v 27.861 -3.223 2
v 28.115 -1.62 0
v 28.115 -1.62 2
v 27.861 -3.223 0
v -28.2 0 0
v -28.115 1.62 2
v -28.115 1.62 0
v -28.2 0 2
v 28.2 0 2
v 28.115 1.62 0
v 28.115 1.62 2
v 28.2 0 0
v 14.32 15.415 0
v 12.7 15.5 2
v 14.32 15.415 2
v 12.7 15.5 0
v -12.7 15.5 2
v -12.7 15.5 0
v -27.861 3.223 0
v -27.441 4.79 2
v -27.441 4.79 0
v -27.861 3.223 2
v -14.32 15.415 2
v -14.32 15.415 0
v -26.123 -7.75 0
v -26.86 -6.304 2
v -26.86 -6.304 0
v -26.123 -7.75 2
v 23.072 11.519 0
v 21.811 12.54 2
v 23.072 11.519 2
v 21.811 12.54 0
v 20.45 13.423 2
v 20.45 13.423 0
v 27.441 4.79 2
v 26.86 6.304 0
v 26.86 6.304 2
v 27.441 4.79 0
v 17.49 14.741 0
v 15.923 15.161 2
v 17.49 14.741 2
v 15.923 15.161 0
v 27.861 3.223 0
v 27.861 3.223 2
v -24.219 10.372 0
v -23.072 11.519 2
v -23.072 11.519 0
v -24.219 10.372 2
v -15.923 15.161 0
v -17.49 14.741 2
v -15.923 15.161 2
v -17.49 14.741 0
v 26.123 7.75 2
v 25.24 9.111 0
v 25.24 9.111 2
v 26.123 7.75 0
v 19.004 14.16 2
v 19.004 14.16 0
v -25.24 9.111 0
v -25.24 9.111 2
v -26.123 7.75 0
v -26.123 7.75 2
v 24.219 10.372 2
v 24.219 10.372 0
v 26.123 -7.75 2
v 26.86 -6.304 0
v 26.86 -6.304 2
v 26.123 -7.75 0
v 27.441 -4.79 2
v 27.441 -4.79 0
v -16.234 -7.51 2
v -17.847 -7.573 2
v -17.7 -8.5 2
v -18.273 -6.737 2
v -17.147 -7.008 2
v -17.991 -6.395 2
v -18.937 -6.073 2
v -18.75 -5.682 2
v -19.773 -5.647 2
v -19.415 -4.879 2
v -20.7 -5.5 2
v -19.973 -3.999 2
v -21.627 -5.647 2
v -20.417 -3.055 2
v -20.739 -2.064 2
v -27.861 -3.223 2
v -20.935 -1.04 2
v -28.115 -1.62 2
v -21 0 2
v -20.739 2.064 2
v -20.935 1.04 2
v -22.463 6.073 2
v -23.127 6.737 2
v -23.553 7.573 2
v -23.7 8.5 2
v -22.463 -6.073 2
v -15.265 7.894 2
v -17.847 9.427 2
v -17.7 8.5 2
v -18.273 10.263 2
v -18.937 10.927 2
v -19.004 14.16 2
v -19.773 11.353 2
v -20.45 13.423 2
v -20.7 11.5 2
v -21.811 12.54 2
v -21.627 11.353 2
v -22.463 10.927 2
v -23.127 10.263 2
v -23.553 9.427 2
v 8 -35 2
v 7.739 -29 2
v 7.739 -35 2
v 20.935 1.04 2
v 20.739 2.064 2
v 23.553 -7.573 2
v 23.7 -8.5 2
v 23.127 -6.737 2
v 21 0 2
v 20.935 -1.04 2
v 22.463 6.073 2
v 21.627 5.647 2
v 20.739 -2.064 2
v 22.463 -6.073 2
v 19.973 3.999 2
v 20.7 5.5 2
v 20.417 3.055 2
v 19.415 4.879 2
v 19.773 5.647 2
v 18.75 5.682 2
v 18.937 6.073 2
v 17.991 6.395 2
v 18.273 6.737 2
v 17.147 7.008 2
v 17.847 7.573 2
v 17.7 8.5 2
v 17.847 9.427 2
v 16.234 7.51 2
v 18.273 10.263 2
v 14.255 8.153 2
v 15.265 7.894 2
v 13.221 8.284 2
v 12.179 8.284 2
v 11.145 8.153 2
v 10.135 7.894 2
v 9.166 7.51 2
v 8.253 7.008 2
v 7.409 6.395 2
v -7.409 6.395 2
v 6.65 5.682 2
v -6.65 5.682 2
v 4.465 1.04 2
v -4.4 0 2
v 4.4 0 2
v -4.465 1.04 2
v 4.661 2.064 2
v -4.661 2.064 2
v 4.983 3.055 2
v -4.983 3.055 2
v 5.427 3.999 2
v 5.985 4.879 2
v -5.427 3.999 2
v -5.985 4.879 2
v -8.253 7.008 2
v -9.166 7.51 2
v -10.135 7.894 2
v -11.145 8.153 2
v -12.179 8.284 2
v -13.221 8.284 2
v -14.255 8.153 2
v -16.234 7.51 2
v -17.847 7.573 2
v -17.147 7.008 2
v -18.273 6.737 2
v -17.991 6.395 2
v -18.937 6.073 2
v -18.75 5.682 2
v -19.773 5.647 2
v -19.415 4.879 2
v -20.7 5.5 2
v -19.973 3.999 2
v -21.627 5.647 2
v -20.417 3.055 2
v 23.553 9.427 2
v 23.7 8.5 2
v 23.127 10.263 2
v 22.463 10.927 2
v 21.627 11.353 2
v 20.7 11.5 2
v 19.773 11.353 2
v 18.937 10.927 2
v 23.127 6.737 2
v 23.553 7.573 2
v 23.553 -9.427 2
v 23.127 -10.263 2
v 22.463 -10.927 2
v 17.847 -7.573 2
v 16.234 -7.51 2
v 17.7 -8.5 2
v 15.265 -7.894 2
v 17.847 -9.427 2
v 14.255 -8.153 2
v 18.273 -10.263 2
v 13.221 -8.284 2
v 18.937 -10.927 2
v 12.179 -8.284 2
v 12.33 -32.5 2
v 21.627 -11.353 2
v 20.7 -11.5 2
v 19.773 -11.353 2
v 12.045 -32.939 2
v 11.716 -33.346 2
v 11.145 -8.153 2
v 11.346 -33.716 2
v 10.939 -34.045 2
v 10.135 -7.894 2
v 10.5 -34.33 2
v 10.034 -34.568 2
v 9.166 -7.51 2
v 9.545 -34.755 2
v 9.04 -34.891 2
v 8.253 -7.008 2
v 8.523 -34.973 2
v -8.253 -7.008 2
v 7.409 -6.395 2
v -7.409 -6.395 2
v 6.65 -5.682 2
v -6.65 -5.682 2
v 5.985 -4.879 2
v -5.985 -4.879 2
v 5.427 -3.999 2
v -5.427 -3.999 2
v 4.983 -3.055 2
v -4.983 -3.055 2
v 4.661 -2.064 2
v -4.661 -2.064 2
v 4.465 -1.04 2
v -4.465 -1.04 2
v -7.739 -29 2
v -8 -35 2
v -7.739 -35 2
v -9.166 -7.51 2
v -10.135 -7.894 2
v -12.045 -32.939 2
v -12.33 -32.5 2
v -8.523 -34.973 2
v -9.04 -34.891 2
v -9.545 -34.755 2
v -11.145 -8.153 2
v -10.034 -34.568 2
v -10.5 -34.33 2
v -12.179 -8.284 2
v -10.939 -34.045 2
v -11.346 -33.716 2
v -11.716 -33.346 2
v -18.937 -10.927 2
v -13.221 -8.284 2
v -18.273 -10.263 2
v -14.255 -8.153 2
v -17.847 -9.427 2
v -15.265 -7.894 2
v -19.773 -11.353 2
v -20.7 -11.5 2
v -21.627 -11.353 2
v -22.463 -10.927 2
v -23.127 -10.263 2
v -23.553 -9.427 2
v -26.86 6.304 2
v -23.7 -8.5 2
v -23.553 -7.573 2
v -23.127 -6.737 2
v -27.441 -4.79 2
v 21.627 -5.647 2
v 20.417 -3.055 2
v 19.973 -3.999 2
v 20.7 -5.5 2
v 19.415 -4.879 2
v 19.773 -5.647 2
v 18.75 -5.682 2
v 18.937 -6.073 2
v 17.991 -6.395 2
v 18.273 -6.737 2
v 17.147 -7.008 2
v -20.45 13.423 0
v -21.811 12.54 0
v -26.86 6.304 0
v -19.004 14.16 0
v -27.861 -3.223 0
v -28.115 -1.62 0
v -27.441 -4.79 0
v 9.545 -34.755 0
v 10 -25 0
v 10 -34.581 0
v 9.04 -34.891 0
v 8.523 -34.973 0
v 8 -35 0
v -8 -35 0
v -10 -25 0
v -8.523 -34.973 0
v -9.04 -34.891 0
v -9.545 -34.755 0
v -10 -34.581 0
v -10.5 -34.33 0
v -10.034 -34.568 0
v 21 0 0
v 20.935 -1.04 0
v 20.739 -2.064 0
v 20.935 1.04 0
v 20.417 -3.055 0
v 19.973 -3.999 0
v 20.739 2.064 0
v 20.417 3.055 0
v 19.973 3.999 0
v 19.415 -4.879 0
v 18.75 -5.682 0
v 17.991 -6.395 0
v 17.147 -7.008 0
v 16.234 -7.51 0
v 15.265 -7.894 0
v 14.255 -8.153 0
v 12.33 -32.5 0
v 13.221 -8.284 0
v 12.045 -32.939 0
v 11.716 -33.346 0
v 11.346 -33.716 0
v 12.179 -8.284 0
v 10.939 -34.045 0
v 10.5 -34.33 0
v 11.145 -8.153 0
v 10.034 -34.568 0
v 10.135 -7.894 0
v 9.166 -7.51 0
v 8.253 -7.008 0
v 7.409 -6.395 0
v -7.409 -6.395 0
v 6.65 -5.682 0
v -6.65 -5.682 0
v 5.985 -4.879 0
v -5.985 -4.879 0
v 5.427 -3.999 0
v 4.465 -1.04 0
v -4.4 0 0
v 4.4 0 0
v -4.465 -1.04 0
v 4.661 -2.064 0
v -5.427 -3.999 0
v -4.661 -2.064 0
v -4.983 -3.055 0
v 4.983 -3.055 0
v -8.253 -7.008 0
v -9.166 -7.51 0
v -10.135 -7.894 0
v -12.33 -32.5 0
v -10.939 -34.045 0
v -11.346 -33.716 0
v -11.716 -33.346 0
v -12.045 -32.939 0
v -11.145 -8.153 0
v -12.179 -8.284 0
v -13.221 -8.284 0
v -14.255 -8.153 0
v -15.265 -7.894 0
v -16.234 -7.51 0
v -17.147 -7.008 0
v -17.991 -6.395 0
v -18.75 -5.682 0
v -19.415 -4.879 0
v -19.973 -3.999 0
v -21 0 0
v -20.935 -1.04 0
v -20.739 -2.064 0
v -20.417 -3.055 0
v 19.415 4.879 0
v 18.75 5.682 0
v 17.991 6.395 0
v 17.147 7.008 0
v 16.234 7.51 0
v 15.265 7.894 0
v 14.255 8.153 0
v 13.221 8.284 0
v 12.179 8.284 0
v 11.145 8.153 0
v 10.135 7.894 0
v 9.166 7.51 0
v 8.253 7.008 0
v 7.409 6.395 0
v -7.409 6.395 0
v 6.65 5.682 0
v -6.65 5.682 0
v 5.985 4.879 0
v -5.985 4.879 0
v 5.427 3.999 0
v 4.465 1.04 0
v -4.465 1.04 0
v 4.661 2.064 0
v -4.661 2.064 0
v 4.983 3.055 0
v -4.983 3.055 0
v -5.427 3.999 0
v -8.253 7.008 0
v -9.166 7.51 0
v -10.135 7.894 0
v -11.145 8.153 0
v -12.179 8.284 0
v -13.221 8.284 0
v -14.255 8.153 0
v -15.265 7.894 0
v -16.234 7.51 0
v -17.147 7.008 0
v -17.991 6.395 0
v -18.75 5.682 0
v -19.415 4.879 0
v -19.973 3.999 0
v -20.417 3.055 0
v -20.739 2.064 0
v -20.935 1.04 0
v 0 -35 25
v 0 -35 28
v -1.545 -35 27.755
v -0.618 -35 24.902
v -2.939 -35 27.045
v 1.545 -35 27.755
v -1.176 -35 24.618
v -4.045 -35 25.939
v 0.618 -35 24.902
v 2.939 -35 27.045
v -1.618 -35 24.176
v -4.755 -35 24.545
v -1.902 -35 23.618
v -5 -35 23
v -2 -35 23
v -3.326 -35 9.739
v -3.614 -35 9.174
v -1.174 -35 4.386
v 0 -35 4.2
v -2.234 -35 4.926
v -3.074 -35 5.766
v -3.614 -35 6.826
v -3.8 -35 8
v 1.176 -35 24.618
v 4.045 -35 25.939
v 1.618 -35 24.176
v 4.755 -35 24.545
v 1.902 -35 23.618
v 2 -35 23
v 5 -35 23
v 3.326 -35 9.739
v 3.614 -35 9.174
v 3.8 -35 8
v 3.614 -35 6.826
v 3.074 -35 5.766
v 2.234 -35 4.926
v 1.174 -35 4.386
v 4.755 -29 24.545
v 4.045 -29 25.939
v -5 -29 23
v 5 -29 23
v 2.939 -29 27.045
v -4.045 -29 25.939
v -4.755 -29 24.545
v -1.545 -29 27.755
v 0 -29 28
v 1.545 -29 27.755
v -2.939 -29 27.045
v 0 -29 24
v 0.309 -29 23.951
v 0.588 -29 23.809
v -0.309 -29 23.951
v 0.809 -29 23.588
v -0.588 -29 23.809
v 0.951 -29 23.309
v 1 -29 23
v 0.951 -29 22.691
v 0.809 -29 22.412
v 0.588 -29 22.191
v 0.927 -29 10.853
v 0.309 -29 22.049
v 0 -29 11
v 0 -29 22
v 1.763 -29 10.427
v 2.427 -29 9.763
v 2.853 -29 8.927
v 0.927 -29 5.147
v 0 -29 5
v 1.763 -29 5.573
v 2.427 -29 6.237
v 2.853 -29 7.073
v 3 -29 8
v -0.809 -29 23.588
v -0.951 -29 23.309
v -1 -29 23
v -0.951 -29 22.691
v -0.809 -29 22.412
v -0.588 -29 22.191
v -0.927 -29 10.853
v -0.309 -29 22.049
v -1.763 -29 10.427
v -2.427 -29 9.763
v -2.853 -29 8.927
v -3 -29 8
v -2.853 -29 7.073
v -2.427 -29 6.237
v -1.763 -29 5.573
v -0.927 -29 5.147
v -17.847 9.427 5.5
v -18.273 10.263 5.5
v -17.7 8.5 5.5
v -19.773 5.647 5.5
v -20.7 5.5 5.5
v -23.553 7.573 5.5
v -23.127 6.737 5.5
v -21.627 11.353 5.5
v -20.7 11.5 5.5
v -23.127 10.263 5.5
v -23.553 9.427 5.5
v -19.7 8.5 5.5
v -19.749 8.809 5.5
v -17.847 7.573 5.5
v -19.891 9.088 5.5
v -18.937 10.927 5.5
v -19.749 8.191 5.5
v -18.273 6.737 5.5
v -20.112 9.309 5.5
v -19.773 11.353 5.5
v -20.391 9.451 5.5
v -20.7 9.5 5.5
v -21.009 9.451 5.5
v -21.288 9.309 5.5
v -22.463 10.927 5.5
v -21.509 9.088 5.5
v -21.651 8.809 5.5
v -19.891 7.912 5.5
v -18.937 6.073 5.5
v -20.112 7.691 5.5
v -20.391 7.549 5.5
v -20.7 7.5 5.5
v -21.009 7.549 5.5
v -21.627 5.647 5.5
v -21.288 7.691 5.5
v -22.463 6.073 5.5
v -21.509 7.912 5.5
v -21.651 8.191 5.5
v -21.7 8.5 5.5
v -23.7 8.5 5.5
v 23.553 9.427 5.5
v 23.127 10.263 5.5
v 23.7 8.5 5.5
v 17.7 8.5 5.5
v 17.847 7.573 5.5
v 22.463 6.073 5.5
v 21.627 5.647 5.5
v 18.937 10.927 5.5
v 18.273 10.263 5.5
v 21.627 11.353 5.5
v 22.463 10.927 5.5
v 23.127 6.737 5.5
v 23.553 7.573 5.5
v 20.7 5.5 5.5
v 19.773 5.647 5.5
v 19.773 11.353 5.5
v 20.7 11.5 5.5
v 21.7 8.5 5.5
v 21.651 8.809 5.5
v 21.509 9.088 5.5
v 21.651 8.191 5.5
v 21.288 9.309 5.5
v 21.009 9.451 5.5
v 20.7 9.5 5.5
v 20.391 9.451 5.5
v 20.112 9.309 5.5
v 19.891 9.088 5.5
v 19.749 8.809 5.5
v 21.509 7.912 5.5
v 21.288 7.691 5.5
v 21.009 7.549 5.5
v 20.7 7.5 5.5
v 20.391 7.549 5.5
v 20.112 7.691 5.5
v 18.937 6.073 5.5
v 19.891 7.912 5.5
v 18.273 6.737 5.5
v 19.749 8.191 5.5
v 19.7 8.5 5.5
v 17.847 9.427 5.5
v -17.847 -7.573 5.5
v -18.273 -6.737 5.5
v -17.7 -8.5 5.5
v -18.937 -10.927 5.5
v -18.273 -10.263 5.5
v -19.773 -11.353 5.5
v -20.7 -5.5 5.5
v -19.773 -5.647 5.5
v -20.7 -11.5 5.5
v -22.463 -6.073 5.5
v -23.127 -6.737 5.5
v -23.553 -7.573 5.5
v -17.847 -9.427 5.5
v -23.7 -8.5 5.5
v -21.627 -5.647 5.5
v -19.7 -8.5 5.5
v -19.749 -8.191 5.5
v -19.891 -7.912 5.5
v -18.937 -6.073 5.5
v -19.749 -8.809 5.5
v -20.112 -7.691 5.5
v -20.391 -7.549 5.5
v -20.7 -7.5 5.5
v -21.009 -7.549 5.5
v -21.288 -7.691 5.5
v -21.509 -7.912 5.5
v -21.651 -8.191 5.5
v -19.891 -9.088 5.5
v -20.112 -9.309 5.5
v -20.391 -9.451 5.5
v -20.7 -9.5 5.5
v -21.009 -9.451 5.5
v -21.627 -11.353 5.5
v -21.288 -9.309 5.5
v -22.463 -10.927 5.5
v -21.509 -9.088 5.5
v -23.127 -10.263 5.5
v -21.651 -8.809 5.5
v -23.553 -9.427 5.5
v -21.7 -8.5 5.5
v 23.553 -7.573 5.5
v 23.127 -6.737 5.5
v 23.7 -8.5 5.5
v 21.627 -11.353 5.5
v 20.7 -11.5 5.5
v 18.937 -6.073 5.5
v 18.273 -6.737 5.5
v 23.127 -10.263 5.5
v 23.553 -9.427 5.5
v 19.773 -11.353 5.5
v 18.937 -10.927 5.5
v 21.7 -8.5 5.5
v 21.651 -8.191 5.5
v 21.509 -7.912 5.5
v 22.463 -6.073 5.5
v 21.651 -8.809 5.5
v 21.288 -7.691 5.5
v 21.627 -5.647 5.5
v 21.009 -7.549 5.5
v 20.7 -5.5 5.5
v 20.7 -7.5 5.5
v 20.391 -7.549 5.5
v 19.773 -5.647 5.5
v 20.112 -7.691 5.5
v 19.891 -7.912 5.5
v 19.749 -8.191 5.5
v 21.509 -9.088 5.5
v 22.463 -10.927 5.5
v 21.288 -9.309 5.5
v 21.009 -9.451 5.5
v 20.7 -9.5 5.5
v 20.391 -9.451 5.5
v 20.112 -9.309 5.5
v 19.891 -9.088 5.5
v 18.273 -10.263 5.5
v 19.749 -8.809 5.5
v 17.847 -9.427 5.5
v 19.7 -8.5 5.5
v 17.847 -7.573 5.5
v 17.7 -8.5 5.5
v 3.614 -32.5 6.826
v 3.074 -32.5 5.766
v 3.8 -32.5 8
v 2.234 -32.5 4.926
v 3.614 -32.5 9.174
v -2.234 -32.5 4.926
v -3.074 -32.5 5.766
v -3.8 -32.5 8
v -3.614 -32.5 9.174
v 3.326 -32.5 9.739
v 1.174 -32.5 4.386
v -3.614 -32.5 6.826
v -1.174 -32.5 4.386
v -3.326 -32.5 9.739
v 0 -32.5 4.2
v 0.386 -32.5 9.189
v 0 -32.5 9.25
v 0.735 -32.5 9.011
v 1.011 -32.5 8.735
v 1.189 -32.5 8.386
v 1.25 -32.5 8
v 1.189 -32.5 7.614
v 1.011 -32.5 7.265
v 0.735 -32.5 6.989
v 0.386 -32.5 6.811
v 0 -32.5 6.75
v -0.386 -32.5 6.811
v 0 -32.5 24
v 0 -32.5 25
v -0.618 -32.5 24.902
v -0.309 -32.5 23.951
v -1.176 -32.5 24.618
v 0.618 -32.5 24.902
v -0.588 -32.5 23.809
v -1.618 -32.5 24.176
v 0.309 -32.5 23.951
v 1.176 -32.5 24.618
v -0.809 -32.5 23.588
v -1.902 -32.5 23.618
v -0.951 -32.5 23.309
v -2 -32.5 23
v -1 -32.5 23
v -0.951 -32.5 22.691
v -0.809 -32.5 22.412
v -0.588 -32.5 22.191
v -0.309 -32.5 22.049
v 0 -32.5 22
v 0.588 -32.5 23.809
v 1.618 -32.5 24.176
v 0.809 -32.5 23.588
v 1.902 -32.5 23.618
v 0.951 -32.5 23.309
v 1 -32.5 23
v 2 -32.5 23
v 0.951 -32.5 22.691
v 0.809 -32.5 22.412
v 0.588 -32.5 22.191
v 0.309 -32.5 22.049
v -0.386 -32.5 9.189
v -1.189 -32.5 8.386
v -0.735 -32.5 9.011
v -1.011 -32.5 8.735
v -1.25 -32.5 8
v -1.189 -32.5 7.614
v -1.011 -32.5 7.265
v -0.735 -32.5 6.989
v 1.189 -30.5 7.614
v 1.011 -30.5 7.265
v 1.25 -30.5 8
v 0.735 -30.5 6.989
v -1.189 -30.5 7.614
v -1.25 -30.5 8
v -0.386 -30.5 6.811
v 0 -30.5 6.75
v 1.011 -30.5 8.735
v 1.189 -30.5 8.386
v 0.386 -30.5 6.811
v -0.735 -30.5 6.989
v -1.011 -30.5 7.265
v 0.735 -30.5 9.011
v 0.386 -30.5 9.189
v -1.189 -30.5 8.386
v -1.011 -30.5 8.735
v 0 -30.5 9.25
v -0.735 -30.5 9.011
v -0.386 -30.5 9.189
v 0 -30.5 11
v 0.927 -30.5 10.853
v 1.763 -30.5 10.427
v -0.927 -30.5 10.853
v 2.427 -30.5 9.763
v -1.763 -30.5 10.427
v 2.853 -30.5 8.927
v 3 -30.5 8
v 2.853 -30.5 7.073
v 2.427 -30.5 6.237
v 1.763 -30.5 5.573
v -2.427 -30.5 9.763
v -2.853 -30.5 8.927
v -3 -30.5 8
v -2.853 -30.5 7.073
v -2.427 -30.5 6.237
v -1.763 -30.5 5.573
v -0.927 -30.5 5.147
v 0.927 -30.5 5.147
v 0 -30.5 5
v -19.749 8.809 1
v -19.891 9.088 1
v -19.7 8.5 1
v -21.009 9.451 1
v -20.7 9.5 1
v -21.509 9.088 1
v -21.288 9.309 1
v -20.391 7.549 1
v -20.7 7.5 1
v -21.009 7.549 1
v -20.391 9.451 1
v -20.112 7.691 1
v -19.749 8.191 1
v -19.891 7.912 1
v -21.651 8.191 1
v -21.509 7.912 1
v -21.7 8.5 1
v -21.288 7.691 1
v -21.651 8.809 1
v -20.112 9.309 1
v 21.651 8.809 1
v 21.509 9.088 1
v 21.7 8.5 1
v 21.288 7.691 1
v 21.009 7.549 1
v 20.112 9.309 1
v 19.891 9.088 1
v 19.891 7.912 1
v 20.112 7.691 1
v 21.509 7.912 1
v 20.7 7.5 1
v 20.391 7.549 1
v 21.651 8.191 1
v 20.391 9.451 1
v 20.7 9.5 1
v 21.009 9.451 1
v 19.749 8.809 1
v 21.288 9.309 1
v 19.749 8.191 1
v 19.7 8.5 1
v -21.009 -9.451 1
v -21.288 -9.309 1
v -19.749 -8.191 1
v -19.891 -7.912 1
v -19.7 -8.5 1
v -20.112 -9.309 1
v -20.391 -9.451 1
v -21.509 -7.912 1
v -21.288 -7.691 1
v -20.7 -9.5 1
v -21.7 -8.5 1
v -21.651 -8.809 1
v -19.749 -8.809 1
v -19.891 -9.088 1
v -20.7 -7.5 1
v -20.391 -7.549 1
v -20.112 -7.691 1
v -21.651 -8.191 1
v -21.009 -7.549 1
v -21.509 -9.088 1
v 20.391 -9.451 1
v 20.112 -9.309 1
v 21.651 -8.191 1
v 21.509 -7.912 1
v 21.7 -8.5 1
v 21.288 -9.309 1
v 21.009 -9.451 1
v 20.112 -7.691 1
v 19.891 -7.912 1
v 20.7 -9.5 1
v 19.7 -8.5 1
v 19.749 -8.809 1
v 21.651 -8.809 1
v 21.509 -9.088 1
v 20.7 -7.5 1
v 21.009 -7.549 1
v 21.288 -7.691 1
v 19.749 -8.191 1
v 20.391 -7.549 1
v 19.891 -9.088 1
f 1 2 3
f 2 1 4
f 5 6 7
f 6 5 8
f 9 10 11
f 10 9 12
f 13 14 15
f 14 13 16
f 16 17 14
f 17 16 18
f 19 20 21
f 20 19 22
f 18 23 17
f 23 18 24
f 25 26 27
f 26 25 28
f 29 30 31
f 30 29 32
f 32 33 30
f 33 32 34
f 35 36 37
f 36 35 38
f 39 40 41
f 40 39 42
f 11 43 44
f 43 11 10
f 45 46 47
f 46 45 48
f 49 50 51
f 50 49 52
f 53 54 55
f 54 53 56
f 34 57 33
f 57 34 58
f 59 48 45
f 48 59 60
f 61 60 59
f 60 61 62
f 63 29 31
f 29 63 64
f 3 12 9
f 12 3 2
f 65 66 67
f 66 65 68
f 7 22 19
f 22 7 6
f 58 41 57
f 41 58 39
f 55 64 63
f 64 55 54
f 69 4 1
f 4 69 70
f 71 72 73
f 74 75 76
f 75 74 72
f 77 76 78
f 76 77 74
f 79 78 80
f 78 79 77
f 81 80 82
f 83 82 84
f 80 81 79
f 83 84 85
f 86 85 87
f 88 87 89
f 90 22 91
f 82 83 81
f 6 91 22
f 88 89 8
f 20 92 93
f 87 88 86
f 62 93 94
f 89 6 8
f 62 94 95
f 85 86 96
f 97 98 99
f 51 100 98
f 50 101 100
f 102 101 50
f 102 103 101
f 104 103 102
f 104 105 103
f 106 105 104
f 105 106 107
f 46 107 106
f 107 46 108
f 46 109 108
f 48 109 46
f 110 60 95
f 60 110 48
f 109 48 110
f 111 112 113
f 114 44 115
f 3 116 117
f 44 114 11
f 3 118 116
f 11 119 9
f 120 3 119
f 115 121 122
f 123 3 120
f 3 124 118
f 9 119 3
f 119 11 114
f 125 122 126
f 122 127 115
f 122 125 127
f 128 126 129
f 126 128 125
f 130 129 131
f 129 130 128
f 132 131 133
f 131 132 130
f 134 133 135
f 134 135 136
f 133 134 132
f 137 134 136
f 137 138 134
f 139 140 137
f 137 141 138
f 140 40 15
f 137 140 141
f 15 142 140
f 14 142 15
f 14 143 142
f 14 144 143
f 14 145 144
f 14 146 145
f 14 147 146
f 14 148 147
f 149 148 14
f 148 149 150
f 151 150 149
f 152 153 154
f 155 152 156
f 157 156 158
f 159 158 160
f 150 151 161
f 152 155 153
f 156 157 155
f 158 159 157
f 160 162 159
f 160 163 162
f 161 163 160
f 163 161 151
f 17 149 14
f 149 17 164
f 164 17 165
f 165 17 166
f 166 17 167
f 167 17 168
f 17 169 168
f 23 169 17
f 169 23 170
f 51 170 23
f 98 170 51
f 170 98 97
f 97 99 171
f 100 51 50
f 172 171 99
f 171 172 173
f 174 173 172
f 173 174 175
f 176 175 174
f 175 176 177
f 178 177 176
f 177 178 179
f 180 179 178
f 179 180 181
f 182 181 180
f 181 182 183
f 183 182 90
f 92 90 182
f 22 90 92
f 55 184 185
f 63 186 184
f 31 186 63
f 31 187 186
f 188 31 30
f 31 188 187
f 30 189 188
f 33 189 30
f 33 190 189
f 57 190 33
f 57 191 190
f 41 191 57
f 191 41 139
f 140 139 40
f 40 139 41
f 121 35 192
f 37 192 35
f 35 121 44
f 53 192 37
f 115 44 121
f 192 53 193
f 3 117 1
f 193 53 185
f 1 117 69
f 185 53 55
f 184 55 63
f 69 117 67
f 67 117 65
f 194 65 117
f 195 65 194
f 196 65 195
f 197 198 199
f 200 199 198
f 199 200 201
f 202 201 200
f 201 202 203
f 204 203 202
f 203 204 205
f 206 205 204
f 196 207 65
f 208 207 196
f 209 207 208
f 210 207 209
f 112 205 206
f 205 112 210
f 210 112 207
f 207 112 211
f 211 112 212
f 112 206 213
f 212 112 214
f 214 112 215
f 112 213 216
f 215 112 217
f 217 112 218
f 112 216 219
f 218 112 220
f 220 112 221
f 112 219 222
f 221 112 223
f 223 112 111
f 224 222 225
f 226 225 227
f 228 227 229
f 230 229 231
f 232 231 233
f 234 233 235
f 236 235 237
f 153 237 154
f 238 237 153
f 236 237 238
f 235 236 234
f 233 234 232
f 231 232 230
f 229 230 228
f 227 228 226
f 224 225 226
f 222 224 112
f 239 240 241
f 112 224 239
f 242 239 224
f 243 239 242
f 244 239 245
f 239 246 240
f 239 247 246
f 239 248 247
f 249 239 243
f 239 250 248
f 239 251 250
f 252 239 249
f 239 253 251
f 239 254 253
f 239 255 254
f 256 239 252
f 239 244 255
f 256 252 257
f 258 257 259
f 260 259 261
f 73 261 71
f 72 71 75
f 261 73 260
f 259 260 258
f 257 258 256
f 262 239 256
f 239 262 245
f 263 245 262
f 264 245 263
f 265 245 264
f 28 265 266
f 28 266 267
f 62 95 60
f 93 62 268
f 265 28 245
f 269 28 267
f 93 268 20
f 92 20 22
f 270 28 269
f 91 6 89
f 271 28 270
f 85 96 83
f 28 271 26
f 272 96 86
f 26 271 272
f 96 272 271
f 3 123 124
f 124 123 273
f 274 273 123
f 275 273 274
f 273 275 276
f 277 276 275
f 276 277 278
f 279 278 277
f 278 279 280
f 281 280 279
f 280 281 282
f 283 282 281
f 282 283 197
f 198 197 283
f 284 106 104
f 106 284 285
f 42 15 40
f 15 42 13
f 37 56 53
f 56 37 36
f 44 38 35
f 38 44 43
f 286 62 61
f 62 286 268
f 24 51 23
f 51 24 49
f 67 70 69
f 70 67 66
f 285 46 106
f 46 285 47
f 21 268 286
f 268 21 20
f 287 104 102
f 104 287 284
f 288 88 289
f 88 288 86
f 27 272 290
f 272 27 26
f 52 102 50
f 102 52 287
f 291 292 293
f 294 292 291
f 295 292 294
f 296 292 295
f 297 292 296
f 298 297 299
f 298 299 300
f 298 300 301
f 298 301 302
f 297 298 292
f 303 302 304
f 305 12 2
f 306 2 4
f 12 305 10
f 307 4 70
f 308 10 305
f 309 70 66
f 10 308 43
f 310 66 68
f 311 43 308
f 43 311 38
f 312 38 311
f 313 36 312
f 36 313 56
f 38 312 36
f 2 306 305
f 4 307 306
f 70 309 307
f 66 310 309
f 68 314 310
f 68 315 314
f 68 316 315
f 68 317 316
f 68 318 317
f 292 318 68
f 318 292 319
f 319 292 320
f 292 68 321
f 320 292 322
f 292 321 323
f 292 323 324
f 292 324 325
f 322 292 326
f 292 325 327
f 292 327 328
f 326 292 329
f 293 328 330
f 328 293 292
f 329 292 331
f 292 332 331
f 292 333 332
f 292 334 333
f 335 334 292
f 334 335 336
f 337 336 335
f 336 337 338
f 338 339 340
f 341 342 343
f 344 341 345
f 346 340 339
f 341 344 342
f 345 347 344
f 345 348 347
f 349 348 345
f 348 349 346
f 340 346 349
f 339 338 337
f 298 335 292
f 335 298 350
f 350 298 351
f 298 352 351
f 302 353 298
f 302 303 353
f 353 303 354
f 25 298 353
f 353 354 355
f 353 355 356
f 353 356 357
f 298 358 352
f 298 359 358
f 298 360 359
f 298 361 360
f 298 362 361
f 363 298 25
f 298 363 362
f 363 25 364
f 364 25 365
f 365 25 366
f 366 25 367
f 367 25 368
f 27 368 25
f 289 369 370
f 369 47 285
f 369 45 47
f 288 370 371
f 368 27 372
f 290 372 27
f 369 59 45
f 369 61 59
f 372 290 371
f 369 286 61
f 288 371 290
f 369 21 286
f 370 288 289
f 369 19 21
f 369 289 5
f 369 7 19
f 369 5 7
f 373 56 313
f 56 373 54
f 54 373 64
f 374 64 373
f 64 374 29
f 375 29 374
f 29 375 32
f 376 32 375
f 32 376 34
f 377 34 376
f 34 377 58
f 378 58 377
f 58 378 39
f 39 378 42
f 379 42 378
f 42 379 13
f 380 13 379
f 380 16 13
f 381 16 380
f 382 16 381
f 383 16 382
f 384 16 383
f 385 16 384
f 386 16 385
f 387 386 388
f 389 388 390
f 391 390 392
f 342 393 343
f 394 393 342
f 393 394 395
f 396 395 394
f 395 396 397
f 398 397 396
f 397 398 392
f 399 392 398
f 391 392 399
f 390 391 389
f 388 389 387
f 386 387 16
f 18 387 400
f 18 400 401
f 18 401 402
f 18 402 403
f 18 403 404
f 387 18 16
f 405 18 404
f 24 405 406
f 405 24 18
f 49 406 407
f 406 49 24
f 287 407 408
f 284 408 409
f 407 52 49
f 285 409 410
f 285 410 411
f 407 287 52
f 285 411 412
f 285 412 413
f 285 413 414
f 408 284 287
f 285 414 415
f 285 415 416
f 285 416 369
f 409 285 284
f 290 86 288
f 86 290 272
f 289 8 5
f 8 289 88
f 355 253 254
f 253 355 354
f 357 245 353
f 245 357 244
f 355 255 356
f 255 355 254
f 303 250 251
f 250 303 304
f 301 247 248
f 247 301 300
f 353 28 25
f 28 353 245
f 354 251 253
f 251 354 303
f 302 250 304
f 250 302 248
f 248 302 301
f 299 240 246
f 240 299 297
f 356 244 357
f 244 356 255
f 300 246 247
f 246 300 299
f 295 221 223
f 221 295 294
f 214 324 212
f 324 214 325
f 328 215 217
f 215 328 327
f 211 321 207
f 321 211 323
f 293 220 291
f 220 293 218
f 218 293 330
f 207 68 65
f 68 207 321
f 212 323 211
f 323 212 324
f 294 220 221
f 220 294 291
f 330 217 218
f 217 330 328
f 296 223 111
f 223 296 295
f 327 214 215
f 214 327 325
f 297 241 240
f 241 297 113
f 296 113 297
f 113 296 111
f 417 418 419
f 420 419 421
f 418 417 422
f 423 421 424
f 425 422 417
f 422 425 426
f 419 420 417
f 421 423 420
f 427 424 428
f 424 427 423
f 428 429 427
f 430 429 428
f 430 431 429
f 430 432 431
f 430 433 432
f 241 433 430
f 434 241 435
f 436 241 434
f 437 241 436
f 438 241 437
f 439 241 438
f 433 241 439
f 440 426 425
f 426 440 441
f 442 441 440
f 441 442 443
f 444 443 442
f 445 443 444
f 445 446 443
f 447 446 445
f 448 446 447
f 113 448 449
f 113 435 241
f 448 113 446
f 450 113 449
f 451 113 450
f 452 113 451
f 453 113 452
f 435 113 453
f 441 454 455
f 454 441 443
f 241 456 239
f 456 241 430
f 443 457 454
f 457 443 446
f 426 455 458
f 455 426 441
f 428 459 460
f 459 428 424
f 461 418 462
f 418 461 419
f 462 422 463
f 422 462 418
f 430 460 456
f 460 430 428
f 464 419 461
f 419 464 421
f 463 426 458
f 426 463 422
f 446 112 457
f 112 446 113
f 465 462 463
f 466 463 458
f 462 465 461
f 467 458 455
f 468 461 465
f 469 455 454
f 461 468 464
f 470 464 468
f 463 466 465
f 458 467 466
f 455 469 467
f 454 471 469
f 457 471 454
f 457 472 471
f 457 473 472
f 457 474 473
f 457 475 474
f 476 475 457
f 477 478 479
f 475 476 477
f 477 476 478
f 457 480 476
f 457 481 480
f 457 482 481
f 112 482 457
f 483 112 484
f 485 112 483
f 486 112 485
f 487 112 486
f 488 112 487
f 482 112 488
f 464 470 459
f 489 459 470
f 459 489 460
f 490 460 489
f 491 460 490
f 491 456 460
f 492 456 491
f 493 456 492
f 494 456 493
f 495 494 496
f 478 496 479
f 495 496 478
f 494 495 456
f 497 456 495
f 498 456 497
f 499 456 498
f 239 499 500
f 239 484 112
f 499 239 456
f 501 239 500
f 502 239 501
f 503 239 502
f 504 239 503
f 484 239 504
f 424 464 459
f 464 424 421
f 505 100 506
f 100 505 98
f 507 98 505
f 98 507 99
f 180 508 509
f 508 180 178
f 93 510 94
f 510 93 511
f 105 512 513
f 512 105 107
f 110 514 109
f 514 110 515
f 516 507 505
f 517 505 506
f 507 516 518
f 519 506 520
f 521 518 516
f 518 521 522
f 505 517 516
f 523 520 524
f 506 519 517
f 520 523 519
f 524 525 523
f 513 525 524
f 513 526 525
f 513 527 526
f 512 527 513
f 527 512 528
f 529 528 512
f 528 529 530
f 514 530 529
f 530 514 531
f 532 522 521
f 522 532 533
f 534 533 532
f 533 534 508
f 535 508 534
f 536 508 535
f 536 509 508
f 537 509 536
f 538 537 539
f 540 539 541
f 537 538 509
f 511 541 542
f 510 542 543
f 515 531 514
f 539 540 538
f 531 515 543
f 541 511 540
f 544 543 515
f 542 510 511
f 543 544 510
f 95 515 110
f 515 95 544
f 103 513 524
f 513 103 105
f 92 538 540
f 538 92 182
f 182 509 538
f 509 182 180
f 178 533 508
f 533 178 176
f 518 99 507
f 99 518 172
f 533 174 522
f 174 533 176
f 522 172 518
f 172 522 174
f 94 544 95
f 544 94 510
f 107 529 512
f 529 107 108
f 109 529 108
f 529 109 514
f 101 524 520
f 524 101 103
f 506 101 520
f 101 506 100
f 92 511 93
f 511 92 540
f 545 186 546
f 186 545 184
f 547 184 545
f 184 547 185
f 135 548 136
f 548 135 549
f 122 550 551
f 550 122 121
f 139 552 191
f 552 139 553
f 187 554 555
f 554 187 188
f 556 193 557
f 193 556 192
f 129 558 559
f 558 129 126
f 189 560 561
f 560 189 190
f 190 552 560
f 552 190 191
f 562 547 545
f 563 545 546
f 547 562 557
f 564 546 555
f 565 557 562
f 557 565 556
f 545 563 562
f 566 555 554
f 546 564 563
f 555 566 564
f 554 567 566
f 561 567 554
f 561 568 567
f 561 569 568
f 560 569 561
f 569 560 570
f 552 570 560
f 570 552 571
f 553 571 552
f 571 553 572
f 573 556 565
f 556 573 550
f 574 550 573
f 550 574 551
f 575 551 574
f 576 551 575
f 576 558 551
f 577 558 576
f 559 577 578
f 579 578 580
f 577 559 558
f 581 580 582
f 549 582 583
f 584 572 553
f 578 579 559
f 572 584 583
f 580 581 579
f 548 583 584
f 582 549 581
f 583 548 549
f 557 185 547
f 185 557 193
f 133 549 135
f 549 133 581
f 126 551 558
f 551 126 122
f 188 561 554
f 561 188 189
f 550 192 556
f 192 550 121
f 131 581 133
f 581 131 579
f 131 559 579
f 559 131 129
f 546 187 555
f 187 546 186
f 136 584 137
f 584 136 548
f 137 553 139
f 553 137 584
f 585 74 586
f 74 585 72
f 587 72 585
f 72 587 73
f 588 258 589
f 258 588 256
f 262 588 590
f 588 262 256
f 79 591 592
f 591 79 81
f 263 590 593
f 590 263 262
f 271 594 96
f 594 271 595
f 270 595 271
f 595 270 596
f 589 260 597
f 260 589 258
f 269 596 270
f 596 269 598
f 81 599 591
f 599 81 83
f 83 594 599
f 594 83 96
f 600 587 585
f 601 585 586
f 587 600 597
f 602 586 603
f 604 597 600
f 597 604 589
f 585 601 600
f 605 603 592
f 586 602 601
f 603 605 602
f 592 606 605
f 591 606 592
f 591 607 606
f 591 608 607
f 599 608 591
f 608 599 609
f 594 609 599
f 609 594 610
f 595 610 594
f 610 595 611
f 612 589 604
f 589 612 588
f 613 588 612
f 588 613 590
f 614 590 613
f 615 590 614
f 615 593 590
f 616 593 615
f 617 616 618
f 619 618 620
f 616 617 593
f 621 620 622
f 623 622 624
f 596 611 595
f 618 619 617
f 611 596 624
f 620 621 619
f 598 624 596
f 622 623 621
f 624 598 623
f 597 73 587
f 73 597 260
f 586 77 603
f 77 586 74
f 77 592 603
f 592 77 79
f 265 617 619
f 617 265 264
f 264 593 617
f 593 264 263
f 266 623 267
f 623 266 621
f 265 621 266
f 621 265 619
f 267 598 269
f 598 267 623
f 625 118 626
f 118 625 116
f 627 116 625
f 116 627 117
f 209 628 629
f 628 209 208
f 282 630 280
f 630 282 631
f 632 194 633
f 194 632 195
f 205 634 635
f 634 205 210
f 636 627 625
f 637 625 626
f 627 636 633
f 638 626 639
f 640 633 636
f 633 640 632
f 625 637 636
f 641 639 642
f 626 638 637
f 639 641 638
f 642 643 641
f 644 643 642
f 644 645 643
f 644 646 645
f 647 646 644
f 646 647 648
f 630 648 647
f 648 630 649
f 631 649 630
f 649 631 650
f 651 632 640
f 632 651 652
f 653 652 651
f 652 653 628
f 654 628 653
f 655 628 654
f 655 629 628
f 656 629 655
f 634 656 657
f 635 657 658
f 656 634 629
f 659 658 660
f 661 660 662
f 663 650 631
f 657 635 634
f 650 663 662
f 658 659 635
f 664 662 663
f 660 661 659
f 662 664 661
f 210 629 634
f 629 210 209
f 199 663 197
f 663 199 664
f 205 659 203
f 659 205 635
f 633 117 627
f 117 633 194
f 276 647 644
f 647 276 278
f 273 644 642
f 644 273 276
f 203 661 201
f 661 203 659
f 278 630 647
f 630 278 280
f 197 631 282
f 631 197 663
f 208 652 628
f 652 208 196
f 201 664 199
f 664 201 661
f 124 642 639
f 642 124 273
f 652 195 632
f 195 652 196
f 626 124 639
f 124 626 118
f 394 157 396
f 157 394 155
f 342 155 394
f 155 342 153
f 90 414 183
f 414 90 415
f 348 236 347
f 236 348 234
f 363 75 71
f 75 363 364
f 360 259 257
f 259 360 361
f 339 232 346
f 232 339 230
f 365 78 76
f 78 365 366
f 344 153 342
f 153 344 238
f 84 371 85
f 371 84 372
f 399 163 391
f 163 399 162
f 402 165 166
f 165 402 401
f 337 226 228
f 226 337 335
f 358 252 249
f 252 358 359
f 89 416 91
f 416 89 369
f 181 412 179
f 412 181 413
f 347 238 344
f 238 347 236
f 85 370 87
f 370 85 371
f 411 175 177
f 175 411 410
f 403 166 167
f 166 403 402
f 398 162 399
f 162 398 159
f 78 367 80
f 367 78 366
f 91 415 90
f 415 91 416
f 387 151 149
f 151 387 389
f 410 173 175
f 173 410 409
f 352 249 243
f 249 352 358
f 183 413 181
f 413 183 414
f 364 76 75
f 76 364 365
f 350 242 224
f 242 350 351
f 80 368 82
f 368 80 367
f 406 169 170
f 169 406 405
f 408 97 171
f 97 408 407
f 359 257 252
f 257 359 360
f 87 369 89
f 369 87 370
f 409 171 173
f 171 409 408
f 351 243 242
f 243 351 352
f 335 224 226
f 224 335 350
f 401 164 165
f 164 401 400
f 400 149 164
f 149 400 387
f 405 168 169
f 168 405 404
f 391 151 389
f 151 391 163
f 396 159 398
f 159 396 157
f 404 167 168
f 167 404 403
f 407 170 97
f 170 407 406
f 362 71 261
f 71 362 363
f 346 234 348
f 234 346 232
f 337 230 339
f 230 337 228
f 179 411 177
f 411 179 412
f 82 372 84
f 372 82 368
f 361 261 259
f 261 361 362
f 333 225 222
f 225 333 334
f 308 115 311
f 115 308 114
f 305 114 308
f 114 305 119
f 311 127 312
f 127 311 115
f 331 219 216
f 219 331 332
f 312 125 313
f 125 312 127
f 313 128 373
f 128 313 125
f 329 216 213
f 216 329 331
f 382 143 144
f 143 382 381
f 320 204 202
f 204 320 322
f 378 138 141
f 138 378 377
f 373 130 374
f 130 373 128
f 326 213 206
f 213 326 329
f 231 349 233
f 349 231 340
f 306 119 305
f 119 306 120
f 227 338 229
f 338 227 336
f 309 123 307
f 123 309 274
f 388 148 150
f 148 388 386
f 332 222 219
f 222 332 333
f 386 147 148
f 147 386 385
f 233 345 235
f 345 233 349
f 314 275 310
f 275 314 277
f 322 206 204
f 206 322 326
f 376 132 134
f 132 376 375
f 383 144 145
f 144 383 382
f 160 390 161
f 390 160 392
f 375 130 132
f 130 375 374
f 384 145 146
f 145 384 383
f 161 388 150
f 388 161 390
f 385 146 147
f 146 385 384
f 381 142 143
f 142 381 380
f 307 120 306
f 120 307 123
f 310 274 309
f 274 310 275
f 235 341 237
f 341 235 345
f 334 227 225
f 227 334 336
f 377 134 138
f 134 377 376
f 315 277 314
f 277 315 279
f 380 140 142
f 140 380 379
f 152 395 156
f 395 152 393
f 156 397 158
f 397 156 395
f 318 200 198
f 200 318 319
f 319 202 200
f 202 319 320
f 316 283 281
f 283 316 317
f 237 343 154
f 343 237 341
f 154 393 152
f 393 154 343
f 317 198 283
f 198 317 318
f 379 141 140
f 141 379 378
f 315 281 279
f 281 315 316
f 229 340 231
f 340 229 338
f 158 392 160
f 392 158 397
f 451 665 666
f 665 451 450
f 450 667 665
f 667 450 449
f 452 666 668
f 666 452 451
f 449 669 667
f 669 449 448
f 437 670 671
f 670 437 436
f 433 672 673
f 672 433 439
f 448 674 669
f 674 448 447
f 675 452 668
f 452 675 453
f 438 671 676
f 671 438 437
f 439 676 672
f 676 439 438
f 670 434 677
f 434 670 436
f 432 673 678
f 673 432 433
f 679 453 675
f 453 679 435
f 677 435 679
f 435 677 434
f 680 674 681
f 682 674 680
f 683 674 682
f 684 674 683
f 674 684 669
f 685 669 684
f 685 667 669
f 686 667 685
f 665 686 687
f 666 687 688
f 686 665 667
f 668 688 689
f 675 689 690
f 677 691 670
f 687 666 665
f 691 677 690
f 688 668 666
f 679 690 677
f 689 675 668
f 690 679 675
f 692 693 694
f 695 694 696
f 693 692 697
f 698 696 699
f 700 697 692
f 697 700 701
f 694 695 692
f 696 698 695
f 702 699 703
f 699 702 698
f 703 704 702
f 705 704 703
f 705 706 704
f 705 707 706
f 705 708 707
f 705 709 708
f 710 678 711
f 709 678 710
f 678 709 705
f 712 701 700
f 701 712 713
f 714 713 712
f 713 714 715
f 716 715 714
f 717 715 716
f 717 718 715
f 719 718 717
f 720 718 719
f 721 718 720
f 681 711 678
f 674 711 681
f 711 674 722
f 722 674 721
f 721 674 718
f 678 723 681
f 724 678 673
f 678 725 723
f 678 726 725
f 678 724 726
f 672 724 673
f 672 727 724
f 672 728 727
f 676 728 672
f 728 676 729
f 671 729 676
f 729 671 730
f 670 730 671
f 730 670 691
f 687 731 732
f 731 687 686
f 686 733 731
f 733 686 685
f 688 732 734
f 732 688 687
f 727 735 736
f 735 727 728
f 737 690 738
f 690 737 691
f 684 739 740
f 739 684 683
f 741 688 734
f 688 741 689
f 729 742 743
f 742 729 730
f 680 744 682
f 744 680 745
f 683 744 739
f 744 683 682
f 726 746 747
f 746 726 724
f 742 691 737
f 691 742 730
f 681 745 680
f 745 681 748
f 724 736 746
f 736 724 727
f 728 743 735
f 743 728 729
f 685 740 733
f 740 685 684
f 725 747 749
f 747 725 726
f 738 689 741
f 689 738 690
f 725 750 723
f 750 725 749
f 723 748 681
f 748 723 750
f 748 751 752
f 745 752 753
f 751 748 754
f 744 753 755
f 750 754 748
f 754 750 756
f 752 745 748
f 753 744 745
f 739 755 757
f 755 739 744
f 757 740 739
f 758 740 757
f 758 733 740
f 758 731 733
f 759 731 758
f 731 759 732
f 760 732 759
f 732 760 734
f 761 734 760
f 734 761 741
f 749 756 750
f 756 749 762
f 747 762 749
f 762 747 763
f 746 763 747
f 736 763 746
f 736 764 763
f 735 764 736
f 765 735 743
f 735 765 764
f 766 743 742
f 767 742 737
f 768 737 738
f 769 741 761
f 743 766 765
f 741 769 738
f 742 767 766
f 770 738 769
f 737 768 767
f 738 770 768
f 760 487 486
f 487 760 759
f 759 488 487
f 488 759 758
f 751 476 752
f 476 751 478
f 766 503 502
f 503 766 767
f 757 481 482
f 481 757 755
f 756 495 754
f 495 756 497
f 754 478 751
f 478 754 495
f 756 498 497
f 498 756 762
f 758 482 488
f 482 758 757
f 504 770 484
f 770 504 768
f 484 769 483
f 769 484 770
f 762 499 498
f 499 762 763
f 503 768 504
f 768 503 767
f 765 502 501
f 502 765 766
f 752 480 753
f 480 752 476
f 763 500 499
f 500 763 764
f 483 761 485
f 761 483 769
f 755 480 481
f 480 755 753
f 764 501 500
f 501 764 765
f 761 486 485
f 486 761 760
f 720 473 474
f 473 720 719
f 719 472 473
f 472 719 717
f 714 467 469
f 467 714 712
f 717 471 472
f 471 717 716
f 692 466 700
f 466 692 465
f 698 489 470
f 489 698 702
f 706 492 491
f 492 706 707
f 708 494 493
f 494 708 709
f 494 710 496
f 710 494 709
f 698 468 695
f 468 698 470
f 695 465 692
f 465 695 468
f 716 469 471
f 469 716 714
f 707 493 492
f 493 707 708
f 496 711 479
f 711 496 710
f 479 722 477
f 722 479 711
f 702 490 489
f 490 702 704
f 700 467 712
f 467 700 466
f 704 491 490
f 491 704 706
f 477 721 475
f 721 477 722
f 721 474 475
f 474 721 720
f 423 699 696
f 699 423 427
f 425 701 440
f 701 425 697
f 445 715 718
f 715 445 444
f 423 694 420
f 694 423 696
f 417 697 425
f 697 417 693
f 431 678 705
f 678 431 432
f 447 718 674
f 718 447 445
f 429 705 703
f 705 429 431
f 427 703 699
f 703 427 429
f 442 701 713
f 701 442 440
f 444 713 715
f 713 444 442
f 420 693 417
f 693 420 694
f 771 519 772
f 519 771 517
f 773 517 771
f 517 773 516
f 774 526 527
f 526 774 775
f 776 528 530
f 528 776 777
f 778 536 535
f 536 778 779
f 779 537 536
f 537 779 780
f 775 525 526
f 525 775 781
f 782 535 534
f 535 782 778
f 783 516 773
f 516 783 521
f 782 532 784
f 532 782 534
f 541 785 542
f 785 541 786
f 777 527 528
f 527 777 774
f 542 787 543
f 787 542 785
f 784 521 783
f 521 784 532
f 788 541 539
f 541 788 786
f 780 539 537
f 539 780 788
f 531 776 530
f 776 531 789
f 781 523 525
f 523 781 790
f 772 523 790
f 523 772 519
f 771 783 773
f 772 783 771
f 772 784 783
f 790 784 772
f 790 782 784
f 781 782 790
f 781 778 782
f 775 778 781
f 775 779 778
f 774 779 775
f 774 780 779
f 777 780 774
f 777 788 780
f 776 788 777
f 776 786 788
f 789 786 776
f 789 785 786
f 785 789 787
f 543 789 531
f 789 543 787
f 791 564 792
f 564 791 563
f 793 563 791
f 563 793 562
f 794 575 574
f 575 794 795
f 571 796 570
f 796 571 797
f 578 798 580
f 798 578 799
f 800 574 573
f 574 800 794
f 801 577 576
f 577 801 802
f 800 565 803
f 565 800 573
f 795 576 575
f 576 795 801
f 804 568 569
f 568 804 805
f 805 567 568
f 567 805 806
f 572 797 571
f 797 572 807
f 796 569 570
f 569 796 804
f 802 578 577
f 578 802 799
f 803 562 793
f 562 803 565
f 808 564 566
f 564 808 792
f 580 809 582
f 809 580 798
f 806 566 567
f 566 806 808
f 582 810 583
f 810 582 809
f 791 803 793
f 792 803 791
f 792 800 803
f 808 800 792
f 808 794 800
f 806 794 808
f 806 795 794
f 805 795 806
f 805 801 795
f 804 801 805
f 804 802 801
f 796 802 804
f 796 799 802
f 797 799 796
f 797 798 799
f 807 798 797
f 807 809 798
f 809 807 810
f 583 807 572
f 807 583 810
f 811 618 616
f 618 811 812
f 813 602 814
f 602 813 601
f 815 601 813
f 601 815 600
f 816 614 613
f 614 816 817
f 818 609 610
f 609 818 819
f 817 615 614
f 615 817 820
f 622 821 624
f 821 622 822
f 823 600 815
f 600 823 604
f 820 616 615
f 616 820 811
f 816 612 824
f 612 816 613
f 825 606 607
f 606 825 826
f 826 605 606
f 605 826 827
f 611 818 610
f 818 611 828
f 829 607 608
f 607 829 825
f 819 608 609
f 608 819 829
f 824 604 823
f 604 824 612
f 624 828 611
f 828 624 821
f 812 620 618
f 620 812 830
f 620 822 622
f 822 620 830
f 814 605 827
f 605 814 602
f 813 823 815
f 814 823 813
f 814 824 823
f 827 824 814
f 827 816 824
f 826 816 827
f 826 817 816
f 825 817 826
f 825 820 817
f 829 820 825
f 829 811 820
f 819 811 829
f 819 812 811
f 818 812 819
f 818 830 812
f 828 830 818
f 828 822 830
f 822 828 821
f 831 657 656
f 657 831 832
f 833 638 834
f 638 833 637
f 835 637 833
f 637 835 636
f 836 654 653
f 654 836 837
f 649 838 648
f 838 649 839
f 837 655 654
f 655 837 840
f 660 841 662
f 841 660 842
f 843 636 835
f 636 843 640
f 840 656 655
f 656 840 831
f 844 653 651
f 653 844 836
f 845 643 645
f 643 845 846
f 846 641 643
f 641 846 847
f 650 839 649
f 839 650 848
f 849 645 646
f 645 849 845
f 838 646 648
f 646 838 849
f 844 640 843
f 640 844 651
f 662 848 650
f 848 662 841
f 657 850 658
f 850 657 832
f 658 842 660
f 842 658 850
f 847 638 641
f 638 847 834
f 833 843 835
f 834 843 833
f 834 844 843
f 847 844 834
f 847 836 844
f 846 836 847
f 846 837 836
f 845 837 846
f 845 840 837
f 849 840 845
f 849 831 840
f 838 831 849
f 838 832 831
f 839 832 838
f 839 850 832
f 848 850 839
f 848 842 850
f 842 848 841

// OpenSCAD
//Ultrasonic sensor mount.
//Parametric.
//Oktay Gülmez, 23/2/2016.
//GNU_GPL_V3


//Parameters:
//Distance between centers of transducers in mm.: 25.4mm for HC-SR04.
eyes_width=25.4;
//The diameter of the transducer in mm.: 16mm. mostly. 
eyes_diameter=16;
//Sensor PCB mounting holes in mm.: 41.4x17 for HC-SR04. 
mount_lenght=41.4;
mount_width=17;
//Desired thickness in mm.: Maximum 5mm.
thickness=2;
//Decorations: "1" smile, "2" teeth, "3" vampire, "4" mustage, "5" O, other for none.
face=1;

$fn=20;
difference(){
    union(){
 //Front plate:  
        linear_extrude(height = thickness, convexity = 10, $fn=60) hull() {
   translate([-eyes_width/2,0,0])circle(15.5);
   translate([eyes_width/2,0,0]) circle(15.5);
        }
        linear_extrude(height = thickness, convexity = 10, $fn=60) hull() {
   translate([-eyes_width/2,0,0])circle(15.5);
   translate([-8,-30,0]) circle(5);
        }
        linear_extrude(height = thickness, convexity = 10, $fn=60) hull() {
   translate([eyes_width/2,0,0])circle(15.5);
   translate([8,-30,0]) circle(5);
        }
        
       translate([-8,-35,0]) cube([16,35,thickness]);
        
//Servo mounting bracket:      
       translate([0,-35,0]) rotate([-90,-90,0]) linear_extrude(height = 6, convexity = 10) hull() {
   translate([0,0,0])circle(8);
   translate([23,0,0]) circle(5);
    }

//Sensor PCB mounting tabs:
     translate([-mount_lenght/2,mount_width/2,0]) cylinder(h=thickness+3.5, r=3);
    translate([mount_lenght/2,mount_width/2,0]) cylinder(h=thickness+3.5, r=3);
    translate([-mount_lenght/2,-mount_width/2,0]) cylinder(h=thickness+3.5, r=3);
    translate([mount_lenght/2,-mount_width/2,0]) cylinder(h=thickness+3.5, r=3);
     
}

//Transducers holes:
    translate([-eyes_width/2,0,-1]) cylinder(h=thickness+2, r=eyes_diameter/2+0.3, $fn=50);
   translate([eyes_width/2,0,-1])  cylinder(h=thickness+2, r=eyes_diameter/2+0.3, $fn=50);

//Servo head placement:   
    translate([0,-35,8]) rotate([-90,0,0]) cylinder(h=2.5, r=3.8);
    translate([0,-35-1,8]) rotate([-90,0,0]) cylinder(h=8, r=1.25);
    translate([0,-35+4.5,8]) rotate([-90,0,0]) cylinder(h=3, r=3);
    translate([0,-35-1,23]) rotate([-90,0,0]) cylinder(h=8, r=1);
    
    translate([0,-35,8]) rotate([-90,-90,0]) linear_extrude(height = 2.5, convexity = 10) hull() {
   translate([0,0,0])circle(3.5);
   translate([15,0,0]) circle(2);
    }
    
    

//Sensor PCB mounting screws holes:    
   translate([-mount_lenght/2,mount_width/2,1]) cylinder(h=thickness+3.5, r=1);
    translate([mount_lenght/2,mount_width/2,1]) cylinder(h=thickness+3.5, r=1);
    translate([-mount_lenght/2,-mount_width/2,1]) cylinder(h=thickness+3.5, r=1);
    translate([mount_lenght/2,-mount_width/2,1]) cylinder(h=thickness+3.5, r=1);
    
 //Face decoration:   
    if (face==1) {
    translate([0,0,-1]) 
          linear_extrude(height = thickness+2, convexity = 10, $fn=60)
                import(file = "ultrasonic_face_smile.dxf", layer = "0");
    }
    else if (face==2) {
        linear_extrude(height = thickness+2, convexity = 10, $fn=60)
                import(file = "ultrasonic_face_teeth.dxf", layer = "0");
    }
    else if (face==3) {
        linear_extrude(height = thickness+2, convexity = 10, $fn=60)
                import(file = "ultrasonic_face_vampire.dxf", layer = "0");
    }
    else if (face==4) {
        linear_extrude(height = thickness+2, convexity = 10, $fn=60)
                import(file = "ultrasonic_face_mustage.dxf", layer = "0");
    }
    else if (face==5) {
        linear_extrude(height = thickness+2, convexity = 10, $fn=60)
                import(file = "ultrasonic_face_O.dxf", layer = "0");
    }
    else {
    }
    
//Cleaning overhang:    
    translate([-10,-35,-10]) cube([20,10,10]);
}
